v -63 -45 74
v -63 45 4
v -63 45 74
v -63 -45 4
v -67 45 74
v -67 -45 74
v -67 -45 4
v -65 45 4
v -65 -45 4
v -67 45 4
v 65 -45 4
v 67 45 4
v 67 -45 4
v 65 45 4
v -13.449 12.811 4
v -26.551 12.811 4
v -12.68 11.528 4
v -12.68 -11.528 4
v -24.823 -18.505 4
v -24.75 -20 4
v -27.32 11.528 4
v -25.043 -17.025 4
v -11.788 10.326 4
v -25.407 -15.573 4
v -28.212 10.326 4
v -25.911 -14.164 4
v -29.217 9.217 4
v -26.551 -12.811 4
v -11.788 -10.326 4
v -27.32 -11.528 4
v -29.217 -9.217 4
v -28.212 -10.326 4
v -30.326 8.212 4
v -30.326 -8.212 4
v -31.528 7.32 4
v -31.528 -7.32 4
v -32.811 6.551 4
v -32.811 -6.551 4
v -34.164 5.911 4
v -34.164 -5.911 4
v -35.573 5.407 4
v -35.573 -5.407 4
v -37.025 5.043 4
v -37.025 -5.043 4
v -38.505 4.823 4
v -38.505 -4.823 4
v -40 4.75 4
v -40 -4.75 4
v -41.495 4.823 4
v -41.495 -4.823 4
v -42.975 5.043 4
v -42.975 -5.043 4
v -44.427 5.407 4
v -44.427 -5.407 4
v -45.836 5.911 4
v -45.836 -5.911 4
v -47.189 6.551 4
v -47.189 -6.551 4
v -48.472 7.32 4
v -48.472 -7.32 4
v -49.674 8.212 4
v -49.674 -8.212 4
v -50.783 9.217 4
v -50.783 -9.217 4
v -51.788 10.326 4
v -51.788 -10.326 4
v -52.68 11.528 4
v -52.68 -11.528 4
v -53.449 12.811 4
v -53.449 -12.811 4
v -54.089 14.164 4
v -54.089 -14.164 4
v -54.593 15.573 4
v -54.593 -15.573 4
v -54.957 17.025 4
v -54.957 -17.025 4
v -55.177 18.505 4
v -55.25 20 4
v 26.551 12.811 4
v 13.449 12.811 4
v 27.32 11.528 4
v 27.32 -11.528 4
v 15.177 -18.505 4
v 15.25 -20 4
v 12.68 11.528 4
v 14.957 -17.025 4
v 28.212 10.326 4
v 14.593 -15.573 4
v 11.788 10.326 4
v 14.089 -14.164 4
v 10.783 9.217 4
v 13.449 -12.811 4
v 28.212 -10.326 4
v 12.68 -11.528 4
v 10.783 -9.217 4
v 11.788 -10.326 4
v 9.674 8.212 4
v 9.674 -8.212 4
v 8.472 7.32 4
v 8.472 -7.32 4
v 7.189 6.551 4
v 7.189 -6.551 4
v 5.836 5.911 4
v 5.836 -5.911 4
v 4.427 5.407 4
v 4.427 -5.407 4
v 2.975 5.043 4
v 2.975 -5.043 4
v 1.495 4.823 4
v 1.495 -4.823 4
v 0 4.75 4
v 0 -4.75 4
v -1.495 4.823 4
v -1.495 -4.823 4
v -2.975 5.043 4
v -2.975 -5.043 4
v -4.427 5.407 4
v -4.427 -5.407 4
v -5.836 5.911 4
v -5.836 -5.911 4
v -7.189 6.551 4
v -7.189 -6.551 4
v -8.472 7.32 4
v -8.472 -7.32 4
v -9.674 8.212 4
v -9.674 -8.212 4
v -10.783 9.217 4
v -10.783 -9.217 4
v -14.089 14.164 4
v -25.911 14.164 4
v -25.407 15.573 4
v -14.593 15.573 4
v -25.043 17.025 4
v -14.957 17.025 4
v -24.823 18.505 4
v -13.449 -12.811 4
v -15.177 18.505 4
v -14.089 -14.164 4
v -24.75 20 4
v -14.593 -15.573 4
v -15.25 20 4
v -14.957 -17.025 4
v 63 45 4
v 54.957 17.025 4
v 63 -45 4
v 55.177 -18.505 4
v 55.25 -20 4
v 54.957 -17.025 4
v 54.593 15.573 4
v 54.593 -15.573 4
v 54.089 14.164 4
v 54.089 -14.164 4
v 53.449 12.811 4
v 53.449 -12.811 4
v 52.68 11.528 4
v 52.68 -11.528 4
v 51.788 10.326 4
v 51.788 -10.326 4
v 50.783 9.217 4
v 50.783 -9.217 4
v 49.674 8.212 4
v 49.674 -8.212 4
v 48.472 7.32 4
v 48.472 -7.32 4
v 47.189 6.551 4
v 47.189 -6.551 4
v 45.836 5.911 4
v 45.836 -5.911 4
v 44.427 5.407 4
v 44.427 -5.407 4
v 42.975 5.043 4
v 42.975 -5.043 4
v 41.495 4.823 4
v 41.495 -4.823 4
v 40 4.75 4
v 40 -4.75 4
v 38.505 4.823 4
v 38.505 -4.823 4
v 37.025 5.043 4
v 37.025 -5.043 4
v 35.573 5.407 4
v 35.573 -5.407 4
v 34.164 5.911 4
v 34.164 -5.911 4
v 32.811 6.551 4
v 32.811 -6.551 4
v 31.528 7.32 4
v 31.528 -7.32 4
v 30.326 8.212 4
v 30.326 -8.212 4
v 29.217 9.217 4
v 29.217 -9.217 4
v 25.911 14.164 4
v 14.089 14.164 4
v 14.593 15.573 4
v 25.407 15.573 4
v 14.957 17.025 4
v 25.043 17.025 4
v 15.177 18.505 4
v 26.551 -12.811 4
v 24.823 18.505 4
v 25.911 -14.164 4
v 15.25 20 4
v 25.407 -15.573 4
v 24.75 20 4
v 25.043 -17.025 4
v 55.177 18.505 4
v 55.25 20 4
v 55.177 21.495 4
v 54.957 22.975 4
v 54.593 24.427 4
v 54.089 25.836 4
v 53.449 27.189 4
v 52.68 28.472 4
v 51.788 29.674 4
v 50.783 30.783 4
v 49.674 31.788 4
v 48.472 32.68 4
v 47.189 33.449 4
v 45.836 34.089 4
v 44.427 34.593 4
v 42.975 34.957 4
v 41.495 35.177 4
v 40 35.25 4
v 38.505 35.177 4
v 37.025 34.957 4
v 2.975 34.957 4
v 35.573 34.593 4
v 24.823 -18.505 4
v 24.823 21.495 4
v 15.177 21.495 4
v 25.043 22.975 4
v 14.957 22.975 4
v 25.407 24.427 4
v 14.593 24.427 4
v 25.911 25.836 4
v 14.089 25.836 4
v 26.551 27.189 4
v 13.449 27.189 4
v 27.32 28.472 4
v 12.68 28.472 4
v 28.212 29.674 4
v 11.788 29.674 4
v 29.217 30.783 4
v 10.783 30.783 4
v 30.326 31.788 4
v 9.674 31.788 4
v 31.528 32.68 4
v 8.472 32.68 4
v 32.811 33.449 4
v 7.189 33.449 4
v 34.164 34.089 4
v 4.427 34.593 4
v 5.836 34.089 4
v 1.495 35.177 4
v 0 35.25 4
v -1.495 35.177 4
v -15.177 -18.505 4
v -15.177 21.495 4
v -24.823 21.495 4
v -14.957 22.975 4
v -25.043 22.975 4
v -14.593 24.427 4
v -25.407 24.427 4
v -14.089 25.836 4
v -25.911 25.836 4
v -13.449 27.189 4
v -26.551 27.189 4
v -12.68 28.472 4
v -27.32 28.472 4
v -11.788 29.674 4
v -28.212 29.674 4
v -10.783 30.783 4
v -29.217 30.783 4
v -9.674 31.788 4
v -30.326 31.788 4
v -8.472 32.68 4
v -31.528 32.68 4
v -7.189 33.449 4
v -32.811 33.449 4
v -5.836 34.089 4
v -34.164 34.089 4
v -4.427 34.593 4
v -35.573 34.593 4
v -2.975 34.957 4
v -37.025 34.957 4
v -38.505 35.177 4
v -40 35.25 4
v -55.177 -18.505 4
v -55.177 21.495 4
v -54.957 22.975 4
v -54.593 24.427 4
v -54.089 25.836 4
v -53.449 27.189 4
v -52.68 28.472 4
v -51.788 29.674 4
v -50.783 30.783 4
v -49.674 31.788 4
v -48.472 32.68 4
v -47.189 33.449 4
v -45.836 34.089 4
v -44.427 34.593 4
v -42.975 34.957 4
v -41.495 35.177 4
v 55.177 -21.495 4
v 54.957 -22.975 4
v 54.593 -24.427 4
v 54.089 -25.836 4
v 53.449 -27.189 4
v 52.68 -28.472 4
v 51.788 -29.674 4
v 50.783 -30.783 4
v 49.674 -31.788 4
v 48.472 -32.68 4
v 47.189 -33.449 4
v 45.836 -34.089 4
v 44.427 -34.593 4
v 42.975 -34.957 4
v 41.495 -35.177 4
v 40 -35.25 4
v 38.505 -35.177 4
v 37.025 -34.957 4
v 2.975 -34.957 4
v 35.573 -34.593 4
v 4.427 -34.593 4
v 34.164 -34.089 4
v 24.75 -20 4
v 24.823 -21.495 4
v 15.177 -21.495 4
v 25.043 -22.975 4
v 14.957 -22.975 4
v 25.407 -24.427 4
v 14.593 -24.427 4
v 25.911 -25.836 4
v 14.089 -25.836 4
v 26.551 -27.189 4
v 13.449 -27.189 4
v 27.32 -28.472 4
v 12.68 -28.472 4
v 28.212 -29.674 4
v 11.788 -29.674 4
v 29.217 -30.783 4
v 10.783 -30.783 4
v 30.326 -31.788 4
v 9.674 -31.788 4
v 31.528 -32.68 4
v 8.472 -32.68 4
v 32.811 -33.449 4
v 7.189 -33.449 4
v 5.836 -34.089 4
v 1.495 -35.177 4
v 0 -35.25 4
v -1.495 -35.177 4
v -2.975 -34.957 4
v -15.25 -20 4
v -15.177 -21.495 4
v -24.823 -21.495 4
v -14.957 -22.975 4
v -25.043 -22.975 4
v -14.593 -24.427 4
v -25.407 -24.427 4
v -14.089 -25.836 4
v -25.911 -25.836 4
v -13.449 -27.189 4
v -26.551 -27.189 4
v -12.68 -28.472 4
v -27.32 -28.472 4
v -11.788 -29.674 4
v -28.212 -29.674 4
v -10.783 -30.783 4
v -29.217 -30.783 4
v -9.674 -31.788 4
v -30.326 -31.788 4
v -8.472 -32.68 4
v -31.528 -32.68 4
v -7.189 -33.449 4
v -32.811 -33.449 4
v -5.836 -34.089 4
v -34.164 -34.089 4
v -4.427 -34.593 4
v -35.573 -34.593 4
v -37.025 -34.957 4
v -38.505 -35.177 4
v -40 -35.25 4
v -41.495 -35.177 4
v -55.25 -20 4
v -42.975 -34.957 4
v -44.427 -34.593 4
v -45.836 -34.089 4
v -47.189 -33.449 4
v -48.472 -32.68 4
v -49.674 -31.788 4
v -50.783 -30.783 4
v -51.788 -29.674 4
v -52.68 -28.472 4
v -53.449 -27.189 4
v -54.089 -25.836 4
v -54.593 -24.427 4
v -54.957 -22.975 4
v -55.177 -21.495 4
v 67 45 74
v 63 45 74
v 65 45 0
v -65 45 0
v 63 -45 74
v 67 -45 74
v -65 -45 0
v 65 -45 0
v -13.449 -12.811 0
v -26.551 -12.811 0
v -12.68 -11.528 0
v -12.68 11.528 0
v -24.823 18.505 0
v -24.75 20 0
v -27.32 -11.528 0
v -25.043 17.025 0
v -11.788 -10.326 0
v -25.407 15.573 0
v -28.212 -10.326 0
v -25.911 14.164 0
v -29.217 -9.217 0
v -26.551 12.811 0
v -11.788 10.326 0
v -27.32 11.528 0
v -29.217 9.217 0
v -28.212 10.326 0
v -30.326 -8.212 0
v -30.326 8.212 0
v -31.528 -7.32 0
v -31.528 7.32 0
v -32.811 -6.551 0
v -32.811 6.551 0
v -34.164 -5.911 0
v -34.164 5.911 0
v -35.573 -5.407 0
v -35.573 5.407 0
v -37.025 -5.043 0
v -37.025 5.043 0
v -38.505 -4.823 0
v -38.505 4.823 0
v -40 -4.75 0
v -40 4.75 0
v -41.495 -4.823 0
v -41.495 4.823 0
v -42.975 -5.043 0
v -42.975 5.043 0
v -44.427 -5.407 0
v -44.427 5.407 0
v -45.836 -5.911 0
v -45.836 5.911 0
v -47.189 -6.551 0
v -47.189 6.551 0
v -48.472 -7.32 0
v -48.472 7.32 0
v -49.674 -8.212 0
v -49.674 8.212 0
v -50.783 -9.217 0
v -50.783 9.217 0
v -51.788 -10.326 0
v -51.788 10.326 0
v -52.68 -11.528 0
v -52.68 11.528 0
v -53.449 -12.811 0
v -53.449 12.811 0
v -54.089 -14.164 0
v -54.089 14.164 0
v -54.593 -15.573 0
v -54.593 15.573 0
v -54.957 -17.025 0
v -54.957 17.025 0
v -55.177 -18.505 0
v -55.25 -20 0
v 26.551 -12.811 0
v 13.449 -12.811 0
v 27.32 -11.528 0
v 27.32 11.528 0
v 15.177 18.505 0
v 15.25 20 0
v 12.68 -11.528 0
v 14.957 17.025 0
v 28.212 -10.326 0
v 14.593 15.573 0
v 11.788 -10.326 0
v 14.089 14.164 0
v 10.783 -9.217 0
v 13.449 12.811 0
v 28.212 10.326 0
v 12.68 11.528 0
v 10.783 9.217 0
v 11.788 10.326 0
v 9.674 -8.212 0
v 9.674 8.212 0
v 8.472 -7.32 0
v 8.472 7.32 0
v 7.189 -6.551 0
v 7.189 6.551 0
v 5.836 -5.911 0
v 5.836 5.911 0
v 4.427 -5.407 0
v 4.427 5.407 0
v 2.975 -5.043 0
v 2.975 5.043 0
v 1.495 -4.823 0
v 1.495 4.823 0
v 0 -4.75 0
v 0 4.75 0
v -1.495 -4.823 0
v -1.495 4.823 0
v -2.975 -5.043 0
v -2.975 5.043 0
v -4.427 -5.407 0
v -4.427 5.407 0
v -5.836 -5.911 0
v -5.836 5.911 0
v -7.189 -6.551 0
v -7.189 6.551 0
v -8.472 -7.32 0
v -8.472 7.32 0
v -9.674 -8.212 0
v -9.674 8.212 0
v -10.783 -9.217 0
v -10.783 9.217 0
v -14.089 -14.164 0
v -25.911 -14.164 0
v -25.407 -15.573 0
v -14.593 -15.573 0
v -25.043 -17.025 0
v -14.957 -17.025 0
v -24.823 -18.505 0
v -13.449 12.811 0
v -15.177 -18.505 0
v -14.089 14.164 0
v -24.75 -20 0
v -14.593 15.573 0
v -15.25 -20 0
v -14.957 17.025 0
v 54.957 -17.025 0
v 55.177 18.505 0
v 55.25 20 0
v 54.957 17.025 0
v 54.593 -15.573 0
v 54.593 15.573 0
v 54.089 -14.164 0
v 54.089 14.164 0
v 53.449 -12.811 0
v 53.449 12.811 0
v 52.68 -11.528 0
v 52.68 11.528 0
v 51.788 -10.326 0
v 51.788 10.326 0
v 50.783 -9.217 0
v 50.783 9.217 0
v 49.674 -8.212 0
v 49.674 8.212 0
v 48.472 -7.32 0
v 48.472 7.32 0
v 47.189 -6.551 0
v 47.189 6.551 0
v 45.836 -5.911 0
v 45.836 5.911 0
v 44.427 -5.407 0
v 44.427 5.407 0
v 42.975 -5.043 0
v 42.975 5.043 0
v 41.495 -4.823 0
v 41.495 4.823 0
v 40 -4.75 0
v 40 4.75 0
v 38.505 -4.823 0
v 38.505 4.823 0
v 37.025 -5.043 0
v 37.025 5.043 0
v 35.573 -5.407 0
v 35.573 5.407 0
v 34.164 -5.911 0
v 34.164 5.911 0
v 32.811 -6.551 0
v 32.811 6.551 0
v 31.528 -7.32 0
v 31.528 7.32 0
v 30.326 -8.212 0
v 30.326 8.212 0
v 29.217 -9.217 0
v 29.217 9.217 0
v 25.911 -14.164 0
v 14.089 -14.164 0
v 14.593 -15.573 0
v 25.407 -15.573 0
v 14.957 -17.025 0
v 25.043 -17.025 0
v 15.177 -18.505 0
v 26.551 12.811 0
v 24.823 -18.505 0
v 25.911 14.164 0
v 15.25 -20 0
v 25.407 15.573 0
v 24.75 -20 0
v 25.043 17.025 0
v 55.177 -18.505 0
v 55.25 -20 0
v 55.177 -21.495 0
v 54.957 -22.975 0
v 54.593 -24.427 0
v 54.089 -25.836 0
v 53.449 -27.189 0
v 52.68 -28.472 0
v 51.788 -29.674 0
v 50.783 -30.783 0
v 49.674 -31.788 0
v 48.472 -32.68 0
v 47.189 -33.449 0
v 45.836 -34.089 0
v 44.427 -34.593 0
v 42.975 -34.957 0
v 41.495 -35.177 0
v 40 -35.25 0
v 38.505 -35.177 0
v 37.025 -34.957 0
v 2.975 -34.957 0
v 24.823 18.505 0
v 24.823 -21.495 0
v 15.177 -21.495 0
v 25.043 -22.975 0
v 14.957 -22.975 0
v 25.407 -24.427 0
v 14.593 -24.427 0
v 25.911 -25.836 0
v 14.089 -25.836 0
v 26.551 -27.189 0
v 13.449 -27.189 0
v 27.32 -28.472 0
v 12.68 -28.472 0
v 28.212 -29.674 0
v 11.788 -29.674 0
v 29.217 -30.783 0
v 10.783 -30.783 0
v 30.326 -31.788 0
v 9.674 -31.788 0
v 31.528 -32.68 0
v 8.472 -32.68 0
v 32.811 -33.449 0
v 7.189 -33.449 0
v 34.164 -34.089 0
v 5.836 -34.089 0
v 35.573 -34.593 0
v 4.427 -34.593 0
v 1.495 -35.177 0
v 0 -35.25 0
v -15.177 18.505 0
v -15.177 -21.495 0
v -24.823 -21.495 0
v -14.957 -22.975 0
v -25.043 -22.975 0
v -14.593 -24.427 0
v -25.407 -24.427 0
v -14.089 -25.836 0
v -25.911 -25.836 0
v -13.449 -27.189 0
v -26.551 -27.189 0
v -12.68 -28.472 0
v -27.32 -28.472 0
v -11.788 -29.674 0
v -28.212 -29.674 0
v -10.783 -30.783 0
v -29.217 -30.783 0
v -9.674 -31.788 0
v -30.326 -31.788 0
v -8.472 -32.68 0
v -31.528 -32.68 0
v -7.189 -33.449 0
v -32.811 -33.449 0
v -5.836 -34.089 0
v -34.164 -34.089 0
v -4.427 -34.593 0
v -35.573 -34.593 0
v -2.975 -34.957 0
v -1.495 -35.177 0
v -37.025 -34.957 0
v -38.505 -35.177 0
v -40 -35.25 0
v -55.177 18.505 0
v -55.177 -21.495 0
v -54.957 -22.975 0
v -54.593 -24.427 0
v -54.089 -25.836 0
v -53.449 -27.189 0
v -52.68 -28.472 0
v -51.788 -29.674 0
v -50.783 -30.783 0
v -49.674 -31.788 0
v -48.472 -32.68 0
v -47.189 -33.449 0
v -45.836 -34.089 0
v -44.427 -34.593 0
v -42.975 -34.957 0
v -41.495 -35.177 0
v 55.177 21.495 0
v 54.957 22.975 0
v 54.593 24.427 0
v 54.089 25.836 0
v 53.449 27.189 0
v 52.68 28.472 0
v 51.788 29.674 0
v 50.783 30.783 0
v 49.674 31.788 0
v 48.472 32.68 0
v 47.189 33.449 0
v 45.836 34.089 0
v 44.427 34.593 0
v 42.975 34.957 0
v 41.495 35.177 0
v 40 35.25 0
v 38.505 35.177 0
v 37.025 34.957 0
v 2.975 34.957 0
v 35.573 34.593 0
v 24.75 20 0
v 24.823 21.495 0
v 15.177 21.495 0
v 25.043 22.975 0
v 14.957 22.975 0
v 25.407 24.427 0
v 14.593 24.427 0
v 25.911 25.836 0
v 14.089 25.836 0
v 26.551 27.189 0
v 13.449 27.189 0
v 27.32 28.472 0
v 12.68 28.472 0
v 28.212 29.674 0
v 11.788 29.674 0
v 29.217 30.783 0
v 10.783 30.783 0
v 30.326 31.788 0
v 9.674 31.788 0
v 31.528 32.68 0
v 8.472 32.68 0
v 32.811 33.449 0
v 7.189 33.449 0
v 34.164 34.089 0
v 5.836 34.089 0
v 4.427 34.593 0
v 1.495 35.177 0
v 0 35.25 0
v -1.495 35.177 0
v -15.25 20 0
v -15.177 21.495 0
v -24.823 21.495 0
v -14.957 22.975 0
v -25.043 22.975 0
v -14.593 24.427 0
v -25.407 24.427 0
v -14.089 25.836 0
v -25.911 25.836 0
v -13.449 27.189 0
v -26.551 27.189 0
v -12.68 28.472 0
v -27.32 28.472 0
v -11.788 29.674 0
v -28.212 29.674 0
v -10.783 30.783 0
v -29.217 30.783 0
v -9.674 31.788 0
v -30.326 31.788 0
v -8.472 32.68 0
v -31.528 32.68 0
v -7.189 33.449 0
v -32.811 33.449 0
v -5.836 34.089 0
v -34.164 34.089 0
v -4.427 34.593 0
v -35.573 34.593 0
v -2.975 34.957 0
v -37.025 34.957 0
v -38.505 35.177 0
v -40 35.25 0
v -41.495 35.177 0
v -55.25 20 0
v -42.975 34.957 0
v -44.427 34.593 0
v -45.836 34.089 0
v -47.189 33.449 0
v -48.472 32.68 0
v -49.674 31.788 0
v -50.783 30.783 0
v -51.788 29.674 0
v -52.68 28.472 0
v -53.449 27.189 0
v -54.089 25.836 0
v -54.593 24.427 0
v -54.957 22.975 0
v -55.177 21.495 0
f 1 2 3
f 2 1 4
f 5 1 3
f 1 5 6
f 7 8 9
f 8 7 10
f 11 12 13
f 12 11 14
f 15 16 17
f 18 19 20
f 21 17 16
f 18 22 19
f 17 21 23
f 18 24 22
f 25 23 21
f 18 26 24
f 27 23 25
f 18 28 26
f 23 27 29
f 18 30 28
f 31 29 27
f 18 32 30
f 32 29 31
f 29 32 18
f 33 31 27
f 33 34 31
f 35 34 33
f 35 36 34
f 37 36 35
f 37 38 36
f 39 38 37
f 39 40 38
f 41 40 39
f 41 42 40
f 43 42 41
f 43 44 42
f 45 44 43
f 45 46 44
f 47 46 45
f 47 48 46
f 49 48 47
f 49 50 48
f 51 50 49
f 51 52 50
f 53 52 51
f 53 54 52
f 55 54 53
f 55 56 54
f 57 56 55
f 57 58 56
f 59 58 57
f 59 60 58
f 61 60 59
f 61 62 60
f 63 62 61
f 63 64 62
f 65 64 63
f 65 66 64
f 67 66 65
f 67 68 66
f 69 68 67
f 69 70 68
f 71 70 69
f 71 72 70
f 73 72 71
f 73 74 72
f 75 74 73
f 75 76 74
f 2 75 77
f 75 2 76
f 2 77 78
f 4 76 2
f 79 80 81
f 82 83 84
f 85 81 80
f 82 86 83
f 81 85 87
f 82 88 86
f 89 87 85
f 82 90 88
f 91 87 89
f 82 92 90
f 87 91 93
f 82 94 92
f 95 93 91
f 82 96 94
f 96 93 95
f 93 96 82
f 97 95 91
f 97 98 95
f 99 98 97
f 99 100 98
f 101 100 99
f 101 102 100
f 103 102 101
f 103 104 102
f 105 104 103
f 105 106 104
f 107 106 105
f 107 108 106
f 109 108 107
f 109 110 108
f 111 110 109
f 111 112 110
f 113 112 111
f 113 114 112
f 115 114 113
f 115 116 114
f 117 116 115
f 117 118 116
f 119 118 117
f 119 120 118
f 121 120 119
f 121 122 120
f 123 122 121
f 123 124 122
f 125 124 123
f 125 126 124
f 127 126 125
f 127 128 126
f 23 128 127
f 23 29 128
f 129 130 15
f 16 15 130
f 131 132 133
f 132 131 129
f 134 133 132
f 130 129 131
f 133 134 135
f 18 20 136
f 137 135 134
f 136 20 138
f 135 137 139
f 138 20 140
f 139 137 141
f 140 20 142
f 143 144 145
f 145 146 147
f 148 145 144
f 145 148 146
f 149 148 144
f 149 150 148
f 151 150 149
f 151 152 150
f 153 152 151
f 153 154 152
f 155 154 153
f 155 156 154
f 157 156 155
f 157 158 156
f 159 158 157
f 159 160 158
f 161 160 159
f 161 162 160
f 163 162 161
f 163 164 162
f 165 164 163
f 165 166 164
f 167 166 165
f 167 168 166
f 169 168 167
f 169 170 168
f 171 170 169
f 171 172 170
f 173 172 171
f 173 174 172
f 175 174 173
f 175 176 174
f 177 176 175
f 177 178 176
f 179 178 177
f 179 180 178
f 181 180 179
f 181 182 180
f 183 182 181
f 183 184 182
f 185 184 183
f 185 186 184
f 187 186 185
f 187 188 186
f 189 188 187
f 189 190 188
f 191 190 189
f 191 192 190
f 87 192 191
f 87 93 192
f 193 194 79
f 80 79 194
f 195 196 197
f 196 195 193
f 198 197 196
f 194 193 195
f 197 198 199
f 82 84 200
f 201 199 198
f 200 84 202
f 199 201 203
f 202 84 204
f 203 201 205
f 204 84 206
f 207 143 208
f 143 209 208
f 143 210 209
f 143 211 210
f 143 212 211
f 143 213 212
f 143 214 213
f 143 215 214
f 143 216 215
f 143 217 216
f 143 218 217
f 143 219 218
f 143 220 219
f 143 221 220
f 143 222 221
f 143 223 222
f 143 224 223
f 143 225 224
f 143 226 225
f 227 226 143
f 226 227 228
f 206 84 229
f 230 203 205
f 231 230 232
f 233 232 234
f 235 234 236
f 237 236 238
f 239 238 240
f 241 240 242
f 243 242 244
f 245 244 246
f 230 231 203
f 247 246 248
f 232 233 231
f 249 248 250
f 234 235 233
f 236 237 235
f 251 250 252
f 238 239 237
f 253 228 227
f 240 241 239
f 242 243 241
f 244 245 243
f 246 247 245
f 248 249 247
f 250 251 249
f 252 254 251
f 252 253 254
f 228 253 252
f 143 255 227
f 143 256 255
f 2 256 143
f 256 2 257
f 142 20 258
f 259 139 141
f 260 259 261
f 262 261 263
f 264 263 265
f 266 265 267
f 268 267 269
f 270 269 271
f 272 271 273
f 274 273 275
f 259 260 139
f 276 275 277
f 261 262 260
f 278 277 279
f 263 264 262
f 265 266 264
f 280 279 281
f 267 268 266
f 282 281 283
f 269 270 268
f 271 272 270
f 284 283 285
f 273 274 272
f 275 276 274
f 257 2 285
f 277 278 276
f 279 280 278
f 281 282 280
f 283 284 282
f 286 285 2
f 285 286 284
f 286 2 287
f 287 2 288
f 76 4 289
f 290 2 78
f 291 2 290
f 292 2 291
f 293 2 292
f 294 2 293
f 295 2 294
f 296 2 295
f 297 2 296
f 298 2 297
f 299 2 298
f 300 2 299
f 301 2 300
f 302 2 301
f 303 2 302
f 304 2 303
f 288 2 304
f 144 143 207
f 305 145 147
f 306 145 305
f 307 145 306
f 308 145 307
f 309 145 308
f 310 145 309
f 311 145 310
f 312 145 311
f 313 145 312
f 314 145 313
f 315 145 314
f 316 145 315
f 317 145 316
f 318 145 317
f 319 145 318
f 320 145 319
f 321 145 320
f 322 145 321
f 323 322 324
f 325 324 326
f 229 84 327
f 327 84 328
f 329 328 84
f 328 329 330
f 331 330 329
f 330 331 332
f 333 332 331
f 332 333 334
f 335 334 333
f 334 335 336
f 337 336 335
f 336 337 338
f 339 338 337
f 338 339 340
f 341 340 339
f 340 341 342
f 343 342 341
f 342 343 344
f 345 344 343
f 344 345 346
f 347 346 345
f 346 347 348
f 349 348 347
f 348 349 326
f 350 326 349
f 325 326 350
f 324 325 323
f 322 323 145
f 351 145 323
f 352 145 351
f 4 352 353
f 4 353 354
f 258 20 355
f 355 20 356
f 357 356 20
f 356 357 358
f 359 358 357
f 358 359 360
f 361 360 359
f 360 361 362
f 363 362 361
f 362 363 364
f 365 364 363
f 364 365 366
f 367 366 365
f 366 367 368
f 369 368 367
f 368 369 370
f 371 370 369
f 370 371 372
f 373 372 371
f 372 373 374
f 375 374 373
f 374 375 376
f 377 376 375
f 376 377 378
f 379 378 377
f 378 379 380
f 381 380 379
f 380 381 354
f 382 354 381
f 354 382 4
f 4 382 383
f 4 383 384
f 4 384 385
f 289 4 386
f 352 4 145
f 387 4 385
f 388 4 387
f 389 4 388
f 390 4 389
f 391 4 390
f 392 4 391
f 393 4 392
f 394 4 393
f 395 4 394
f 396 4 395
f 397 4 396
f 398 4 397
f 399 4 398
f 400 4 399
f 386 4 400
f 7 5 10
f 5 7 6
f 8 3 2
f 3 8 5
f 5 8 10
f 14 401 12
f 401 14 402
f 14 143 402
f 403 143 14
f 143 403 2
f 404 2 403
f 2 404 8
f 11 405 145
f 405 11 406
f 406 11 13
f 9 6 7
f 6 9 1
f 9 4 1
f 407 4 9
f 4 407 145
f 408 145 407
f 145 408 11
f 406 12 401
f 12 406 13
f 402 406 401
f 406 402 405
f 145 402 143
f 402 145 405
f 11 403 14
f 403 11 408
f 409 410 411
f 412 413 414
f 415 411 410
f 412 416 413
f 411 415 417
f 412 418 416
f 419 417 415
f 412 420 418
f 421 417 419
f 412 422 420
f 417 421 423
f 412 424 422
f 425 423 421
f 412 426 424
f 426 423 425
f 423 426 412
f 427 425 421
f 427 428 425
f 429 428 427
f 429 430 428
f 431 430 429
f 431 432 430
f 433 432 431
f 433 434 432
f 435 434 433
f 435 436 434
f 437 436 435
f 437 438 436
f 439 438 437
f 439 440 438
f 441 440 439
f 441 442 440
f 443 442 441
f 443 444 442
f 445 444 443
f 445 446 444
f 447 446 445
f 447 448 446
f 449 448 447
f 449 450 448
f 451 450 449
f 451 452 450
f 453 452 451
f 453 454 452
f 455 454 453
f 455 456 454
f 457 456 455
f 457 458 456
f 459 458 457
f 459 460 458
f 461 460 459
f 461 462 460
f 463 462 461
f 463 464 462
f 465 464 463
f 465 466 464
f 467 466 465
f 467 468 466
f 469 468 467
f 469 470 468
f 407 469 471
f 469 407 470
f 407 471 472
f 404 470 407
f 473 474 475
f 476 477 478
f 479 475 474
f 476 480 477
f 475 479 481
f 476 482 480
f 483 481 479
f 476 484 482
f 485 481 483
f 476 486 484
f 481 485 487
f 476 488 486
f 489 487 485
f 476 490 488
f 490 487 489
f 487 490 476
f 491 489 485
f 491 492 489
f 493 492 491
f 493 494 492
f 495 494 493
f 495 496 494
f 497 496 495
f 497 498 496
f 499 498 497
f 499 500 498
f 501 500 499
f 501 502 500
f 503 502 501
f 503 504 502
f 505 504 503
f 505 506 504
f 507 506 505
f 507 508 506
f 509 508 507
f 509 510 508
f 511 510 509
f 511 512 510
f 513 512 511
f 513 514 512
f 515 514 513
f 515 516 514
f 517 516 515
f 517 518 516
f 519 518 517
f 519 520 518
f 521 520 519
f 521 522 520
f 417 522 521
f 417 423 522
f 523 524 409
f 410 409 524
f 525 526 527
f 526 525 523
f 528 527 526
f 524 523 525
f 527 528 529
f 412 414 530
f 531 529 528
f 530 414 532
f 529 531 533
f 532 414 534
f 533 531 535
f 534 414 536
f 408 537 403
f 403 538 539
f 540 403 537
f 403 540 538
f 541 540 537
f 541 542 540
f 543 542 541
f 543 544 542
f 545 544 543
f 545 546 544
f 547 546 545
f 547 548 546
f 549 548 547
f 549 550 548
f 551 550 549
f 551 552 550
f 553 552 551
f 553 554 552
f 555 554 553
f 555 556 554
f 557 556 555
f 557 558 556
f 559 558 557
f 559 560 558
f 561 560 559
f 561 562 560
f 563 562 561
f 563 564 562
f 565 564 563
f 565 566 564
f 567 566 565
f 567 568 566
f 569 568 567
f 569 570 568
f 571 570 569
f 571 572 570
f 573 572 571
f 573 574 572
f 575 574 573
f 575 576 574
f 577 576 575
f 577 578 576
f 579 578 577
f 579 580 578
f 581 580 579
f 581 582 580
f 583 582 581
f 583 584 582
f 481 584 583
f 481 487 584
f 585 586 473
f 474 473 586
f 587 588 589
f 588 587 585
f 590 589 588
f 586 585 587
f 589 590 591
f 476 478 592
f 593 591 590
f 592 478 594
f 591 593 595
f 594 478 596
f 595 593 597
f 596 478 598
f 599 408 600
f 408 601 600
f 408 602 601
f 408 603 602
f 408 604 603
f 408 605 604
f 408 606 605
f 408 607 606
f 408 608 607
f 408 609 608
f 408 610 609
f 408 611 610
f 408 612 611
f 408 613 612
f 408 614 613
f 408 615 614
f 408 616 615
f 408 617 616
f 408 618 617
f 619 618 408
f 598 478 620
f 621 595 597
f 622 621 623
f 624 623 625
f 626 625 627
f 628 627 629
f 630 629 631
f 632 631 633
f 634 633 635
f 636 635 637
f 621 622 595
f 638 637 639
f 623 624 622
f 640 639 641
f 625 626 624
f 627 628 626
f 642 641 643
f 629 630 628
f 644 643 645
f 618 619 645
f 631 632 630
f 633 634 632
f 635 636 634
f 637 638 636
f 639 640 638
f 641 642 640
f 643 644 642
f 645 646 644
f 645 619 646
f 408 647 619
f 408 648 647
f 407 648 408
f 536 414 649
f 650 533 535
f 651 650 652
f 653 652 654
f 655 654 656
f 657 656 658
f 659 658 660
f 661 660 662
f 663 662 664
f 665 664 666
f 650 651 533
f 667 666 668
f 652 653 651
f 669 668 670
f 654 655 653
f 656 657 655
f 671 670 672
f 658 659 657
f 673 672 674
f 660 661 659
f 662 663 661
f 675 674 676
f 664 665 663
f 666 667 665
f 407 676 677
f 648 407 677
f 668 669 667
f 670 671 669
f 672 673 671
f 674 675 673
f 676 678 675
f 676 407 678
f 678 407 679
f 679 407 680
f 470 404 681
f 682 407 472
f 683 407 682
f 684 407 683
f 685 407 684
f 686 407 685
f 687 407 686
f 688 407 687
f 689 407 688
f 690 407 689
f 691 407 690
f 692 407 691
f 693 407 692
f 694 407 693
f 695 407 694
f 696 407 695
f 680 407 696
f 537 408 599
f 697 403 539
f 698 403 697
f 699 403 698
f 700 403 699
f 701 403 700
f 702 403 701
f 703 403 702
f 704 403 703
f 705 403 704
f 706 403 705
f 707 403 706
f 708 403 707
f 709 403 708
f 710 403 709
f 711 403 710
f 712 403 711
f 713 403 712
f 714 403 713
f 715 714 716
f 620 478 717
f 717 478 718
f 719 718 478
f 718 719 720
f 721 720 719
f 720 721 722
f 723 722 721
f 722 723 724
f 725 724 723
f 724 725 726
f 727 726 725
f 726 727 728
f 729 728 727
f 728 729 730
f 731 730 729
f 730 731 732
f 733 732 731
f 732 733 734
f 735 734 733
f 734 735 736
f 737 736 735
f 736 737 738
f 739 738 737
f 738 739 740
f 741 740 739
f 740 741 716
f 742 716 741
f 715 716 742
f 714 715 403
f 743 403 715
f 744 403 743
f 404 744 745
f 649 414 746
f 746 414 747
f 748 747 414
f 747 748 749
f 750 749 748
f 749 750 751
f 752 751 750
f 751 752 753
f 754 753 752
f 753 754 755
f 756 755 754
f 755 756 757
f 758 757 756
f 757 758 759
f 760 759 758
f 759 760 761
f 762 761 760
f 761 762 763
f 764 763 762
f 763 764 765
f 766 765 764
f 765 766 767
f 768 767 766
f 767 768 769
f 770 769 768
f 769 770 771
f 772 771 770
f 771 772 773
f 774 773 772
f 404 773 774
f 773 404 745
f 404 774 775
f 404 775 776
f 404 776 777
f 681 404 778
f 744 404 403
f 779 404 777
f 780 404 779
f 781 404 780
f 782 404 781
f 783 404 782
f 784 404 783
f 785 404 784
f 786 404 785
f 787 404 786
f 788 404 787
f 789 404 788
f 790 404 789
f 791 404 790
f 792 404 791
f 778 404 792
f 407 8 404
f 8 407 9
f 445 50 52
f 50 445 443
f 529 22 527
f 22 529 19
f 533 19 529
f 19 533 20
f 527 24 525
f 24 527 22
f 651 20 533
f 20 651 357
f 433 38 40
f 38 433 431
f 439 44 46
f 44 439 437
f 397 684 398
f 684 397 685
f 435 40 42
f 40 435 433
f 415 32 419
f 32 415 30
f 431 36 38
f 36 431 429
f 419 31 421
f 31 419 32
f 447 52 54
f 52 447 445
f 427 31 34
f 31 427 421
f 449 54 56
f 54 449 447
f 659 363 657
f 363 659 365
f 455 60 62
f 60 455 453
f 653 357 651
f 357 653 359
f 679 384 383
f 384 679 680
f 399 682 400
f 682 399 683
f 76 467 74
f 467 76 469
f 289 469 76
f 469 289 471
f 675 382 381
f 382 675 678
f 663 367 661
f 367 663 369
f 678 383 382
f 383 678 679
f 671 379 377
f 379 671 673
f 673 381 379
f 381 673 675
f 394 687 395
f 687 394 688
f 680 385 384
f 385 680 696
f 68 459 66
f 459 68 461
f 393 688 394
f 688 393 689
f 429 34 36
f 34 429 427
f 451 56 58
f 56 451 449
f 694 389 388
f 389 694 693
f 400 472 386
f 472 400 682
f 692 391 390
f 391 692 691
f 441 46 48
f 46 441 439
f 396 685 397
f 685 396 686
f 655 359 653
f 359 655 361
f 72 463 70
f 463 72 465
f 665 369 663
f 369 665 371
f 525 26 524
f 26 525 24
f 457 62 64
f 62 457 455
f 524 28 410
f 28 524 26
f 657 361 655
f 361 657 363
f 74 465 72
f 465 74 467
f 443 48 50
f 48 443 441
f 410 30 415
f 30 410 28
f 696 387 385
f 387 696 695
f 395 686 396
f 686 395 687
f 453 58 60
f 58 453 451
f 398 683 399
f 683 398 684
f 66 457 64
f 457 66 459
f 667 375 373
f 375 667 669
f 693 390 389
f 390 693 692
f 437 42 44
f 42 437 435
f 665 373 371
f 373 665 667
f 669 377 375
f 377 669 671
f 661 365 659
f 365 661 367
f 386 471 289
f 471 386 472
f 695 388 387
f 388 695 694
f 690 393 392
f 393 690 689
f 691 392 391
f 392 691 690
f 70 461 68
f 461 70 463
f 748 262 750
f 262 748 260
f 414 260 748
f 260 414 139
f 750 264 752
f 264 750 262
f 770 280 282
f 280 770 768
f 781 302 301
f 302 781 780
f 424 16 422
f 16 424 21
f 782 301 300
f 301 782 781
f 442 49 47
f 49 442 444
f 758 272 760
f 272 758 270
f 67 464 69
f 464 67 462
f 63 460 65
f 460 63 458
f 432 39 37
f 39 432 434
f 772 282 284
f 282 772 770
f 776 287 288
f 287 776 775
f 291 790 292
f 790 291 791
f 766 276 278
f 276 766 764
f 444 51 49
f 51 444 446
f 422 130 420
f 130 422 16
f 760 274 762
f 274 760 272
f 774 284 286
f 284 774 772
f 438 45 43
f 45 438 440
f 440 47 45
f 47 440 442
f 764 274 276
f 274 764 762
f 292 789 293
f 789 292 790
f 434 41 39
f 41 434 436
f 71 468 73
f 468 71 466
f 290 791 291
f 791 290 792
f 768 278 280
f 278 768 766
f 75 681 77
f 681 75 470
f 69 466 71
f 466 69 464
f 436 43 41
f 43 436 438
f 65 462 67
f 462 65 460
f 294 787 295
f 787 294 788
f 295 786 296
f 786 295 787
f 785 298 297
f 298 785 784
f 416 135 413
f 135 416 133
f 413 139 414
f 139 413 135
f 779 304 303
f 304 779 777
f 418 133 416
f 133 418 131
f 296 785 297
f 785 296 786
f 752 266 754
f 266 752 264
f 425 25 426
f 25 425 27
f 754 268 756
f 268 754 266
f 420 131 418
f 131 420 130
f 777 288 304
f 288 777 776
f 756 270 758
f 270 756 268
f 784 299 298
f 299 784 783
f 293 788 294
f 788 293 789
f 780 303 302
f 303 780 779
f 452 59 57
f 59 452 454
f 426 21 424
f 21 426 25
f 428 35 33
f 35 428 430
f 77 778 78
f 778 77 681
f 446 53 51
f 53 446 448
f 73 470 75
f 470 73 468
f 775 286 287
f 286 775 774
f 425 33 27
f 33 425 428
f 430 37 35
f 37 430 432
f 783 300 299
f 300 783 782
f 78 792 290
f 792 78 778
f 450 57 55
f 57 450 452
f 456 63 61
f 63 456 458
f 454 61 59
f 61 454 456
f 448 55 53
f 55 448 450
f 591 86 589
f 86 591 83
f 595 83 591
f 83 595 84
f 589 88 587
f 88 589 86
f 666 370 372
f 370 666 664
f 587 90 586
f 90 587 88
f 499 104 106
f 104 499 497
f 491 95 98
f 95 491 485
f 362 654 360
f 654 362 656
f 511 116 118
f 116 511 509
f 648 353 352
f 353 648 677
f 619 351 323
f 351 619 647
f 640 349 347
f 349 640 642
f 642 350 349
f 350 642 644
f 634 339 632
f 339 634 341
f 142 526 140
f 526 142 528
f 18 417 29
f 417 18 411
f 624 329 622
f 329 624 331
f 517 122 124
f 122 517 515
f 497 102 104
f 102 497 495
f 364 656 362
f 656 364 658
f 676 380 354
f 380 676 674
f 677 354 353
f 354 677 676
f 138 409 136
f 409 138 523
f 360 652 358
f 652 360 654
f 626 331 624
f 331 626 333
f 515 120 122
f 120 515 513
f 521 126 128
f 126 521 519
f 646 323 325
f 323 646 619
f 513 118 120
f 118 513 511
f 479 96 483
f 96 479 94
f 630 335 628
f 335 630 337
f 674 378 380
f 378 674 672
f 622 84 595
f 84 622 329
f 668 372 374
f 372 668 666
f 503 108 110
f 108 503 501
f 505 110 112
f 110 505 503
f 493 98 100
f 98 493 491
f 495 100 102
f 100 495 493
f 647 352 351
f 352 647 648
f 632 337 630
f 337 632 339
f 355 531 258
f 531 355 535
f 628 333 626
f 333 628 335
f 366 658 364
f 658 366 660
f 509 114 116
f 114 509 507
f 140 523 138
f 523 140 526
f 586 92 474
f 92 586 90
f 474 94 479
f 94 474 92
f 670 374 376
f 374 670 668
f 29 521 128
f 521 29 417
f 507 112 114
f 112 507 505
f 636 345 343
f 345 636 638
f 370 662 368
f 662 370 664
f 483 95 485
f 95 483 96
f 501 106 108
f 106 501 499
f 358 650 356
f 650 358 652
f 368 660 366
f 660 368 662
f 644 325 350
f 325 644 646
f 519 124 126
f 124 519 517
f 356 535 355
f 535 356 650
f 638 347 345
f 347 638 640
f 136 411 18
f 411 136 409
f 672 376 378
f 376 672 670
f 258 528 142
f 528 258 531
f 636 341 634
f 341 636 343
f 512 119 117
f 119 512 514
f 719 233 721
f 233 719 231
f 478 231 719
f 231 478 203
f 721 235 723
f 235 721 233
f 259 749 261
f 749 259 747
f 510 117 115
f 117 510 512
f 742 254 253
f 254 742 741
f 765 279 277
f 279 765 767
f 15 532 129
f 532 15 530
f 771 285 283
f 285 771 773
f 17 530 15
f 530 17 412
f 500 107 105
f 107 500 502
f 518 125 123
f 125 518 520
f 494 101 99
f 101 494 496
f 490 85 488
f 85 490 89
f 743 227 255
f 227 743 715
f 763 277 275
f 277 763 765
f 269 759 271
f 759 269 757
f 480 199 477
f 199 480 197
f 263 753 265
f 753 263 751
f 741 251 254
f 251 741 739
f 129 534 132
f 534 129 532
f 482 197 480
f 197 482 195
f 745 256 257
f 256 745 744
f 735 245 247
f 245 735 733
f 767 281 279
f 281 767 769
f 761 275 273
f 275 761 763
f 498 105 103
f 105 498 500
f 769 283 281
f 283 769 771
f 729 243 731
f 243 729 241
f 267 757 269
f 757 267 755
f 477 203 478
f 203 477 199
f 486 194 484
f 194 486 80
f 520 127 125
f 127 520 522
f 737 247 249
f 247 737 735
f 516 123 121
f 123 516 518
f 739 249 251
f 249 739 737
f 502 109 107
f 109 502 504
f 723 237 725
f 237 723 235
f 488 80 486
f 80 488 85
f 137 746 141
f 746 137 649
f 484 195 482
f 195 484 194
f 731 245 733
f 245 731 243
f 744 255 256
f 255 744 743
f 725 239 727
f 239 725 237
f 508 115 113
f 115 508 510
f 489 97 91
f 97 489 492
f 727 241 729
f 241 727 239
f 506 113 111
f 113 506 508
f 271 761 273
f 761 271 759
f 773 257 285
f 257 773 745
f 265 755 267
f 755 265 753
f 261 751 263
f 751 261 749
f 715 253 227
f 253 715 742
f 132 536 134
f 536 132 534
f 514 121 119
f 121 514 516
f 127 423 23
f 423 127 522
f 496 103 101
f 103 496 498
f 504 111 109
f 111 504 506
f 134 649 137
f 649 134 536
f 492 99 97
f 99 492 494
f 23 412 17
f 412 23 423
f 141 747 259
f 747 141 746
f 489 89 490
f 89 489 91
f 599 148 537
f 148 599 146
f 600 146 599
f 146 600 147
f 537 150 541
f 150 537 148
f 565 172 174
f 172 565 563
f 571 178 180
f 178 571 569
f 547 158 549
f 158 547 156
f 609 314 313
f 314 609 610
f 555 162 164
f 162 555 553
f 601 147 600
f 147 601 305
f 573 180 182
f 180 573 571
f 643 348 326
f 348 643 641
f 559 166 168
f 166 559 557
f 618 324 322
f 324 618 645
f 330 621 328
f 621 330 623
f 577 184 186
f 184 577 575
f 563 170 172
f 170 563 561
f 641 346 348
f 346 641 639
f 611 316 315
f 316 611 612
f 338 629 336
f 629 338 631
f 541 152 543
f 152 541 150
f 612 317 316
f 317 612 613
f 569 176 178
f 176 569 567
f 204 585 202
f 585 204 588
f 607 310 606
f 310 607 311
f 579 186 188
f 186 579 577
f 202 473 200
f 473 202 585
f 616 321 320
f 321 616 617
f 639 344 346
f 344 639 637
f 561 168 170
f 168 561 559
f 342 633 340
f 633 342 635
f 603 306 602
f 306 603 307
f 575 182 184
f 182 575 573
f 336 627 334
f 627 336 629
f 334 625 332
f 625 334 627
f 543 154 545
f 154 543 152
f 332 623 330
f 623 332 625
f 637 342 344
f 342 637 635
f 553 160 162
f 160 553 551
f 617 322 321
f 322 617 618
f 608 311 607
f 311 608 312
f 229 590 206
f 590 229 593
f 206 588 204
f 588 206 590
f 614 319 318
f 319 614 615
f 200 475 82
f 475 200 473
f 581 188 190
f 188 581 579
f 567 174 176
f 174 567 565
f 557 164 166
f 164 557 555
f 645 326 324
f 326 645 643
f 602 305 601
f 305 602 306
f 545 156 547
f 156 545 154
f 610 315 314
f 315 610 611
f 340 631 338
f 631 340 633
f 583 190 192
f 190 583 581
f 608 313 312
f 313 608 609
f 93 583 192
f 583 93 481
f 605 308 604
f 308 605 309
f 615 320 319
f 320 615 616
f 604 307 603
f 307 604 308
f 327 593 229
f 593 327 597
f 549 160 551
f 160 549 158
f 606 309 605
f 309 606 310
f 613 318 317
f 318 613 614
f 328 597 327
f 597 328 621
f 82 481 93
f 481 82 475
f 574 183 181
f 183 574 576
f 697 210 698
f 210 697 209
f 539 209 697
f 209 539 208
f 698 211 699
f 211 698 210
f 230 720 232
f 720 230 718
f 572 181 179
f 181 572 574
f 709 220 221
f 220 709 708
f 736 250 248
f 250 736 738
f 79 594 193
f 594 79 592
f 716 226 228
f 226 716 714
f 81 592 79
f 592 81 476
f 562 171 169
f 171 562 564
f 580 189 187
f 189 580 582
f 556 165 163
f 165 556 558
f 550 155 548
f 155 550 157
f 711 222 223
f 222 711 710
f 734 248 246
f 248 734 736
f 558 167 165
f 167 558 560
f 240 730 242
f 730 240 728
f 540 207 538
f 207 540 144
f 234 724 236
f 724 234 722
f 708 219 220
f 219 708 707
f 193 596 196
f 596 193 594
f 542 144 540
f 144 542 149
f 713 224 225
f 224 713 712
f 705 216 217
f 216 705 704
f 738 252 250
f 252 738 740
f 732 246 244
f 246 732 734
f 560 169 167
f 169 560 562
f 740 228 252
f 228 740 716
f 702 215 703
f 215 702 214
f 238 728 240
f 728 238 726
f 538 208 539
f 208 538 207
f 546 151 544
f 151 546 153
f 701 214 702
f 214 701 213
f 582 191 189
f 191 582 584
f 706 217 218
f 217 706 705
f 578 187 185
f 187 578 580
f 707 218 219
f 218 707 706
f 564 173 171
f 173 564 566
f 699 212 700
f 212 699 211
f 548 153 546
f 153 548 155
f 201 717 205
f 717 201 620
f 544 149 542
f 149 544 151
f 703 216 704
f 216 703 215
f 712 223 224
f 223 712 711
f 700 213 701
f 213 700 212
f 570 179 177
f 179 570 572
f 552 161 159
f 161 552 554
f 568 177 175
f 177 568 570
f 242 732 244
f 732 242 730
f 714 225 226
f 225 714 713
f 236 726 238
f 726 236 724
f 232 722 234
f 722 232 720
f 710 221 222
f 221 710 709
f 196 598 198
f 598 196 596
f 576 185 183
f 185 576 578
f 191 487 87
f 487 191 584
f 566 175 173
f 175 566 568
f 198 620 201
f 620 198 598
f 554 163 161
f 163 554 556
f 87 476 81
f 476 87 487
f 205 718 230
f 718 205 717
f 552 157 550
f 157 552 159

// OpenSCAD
// Rack for six 50 mL conical (Falcon-type) tubes
// Printed upside down and flipped over after printing

$fn = 64;

// Plate dimensions
plate_x = 130; // mm
plate_y = 90;  // mm
plate_z = 4;   // mm

// Hole dimensions
hole_dia = 30.5; // mm
hole_spacing_x = 40; // mm
hole_spacing_y = 40; // mm

// Calculate hole positions (centered on plate)
// 3 holes along X: positions at -40, 0, +40 mm relative to center
// 2 holes along Y: positions at -20, +20 mm relative to center
hole_positions_x = [-40, 0, 40];
hole_positions_y = [-20, 20];

// Wall dimensions
wall_thickness = 4; // mm
wall_height = 70;   // mm

// Generate holes
module holes() {
    for (x_pos = hole_positions_x) {
        for (y_pos = hole_positions_y) {
            translate([x_pos, y_pos, -1]) 
                cylinder(h = plate_z + 2, d = hole_dia);
        }
    }
}

// Generate walls
module walls() {
    // Left wall (along X axis at left edge)
    translate([-plate_x/2 - wall_thickness/2, -plate_y/2, plate_z])
        cube([wall_thickness, plate_y, wall_height]);
    
    // Right wall (along X axis at right edge)
    translate([plate_x/2 - wall_thickness/2, -plate_y/2, plate_z])
        cube([wall_thickness, plate_y, wall_height]);
}

// Main body: plate with holes and walls
module rack() {
    difference() {
        union() {
            // Base plate
            translate([0, 0, plate_z/2])
                cube([plate_x, plate_y, plate_z], center=true);
            
            // Walls
            walls();
        }
        
        // Holes
        holes();
    }
}

rack();
